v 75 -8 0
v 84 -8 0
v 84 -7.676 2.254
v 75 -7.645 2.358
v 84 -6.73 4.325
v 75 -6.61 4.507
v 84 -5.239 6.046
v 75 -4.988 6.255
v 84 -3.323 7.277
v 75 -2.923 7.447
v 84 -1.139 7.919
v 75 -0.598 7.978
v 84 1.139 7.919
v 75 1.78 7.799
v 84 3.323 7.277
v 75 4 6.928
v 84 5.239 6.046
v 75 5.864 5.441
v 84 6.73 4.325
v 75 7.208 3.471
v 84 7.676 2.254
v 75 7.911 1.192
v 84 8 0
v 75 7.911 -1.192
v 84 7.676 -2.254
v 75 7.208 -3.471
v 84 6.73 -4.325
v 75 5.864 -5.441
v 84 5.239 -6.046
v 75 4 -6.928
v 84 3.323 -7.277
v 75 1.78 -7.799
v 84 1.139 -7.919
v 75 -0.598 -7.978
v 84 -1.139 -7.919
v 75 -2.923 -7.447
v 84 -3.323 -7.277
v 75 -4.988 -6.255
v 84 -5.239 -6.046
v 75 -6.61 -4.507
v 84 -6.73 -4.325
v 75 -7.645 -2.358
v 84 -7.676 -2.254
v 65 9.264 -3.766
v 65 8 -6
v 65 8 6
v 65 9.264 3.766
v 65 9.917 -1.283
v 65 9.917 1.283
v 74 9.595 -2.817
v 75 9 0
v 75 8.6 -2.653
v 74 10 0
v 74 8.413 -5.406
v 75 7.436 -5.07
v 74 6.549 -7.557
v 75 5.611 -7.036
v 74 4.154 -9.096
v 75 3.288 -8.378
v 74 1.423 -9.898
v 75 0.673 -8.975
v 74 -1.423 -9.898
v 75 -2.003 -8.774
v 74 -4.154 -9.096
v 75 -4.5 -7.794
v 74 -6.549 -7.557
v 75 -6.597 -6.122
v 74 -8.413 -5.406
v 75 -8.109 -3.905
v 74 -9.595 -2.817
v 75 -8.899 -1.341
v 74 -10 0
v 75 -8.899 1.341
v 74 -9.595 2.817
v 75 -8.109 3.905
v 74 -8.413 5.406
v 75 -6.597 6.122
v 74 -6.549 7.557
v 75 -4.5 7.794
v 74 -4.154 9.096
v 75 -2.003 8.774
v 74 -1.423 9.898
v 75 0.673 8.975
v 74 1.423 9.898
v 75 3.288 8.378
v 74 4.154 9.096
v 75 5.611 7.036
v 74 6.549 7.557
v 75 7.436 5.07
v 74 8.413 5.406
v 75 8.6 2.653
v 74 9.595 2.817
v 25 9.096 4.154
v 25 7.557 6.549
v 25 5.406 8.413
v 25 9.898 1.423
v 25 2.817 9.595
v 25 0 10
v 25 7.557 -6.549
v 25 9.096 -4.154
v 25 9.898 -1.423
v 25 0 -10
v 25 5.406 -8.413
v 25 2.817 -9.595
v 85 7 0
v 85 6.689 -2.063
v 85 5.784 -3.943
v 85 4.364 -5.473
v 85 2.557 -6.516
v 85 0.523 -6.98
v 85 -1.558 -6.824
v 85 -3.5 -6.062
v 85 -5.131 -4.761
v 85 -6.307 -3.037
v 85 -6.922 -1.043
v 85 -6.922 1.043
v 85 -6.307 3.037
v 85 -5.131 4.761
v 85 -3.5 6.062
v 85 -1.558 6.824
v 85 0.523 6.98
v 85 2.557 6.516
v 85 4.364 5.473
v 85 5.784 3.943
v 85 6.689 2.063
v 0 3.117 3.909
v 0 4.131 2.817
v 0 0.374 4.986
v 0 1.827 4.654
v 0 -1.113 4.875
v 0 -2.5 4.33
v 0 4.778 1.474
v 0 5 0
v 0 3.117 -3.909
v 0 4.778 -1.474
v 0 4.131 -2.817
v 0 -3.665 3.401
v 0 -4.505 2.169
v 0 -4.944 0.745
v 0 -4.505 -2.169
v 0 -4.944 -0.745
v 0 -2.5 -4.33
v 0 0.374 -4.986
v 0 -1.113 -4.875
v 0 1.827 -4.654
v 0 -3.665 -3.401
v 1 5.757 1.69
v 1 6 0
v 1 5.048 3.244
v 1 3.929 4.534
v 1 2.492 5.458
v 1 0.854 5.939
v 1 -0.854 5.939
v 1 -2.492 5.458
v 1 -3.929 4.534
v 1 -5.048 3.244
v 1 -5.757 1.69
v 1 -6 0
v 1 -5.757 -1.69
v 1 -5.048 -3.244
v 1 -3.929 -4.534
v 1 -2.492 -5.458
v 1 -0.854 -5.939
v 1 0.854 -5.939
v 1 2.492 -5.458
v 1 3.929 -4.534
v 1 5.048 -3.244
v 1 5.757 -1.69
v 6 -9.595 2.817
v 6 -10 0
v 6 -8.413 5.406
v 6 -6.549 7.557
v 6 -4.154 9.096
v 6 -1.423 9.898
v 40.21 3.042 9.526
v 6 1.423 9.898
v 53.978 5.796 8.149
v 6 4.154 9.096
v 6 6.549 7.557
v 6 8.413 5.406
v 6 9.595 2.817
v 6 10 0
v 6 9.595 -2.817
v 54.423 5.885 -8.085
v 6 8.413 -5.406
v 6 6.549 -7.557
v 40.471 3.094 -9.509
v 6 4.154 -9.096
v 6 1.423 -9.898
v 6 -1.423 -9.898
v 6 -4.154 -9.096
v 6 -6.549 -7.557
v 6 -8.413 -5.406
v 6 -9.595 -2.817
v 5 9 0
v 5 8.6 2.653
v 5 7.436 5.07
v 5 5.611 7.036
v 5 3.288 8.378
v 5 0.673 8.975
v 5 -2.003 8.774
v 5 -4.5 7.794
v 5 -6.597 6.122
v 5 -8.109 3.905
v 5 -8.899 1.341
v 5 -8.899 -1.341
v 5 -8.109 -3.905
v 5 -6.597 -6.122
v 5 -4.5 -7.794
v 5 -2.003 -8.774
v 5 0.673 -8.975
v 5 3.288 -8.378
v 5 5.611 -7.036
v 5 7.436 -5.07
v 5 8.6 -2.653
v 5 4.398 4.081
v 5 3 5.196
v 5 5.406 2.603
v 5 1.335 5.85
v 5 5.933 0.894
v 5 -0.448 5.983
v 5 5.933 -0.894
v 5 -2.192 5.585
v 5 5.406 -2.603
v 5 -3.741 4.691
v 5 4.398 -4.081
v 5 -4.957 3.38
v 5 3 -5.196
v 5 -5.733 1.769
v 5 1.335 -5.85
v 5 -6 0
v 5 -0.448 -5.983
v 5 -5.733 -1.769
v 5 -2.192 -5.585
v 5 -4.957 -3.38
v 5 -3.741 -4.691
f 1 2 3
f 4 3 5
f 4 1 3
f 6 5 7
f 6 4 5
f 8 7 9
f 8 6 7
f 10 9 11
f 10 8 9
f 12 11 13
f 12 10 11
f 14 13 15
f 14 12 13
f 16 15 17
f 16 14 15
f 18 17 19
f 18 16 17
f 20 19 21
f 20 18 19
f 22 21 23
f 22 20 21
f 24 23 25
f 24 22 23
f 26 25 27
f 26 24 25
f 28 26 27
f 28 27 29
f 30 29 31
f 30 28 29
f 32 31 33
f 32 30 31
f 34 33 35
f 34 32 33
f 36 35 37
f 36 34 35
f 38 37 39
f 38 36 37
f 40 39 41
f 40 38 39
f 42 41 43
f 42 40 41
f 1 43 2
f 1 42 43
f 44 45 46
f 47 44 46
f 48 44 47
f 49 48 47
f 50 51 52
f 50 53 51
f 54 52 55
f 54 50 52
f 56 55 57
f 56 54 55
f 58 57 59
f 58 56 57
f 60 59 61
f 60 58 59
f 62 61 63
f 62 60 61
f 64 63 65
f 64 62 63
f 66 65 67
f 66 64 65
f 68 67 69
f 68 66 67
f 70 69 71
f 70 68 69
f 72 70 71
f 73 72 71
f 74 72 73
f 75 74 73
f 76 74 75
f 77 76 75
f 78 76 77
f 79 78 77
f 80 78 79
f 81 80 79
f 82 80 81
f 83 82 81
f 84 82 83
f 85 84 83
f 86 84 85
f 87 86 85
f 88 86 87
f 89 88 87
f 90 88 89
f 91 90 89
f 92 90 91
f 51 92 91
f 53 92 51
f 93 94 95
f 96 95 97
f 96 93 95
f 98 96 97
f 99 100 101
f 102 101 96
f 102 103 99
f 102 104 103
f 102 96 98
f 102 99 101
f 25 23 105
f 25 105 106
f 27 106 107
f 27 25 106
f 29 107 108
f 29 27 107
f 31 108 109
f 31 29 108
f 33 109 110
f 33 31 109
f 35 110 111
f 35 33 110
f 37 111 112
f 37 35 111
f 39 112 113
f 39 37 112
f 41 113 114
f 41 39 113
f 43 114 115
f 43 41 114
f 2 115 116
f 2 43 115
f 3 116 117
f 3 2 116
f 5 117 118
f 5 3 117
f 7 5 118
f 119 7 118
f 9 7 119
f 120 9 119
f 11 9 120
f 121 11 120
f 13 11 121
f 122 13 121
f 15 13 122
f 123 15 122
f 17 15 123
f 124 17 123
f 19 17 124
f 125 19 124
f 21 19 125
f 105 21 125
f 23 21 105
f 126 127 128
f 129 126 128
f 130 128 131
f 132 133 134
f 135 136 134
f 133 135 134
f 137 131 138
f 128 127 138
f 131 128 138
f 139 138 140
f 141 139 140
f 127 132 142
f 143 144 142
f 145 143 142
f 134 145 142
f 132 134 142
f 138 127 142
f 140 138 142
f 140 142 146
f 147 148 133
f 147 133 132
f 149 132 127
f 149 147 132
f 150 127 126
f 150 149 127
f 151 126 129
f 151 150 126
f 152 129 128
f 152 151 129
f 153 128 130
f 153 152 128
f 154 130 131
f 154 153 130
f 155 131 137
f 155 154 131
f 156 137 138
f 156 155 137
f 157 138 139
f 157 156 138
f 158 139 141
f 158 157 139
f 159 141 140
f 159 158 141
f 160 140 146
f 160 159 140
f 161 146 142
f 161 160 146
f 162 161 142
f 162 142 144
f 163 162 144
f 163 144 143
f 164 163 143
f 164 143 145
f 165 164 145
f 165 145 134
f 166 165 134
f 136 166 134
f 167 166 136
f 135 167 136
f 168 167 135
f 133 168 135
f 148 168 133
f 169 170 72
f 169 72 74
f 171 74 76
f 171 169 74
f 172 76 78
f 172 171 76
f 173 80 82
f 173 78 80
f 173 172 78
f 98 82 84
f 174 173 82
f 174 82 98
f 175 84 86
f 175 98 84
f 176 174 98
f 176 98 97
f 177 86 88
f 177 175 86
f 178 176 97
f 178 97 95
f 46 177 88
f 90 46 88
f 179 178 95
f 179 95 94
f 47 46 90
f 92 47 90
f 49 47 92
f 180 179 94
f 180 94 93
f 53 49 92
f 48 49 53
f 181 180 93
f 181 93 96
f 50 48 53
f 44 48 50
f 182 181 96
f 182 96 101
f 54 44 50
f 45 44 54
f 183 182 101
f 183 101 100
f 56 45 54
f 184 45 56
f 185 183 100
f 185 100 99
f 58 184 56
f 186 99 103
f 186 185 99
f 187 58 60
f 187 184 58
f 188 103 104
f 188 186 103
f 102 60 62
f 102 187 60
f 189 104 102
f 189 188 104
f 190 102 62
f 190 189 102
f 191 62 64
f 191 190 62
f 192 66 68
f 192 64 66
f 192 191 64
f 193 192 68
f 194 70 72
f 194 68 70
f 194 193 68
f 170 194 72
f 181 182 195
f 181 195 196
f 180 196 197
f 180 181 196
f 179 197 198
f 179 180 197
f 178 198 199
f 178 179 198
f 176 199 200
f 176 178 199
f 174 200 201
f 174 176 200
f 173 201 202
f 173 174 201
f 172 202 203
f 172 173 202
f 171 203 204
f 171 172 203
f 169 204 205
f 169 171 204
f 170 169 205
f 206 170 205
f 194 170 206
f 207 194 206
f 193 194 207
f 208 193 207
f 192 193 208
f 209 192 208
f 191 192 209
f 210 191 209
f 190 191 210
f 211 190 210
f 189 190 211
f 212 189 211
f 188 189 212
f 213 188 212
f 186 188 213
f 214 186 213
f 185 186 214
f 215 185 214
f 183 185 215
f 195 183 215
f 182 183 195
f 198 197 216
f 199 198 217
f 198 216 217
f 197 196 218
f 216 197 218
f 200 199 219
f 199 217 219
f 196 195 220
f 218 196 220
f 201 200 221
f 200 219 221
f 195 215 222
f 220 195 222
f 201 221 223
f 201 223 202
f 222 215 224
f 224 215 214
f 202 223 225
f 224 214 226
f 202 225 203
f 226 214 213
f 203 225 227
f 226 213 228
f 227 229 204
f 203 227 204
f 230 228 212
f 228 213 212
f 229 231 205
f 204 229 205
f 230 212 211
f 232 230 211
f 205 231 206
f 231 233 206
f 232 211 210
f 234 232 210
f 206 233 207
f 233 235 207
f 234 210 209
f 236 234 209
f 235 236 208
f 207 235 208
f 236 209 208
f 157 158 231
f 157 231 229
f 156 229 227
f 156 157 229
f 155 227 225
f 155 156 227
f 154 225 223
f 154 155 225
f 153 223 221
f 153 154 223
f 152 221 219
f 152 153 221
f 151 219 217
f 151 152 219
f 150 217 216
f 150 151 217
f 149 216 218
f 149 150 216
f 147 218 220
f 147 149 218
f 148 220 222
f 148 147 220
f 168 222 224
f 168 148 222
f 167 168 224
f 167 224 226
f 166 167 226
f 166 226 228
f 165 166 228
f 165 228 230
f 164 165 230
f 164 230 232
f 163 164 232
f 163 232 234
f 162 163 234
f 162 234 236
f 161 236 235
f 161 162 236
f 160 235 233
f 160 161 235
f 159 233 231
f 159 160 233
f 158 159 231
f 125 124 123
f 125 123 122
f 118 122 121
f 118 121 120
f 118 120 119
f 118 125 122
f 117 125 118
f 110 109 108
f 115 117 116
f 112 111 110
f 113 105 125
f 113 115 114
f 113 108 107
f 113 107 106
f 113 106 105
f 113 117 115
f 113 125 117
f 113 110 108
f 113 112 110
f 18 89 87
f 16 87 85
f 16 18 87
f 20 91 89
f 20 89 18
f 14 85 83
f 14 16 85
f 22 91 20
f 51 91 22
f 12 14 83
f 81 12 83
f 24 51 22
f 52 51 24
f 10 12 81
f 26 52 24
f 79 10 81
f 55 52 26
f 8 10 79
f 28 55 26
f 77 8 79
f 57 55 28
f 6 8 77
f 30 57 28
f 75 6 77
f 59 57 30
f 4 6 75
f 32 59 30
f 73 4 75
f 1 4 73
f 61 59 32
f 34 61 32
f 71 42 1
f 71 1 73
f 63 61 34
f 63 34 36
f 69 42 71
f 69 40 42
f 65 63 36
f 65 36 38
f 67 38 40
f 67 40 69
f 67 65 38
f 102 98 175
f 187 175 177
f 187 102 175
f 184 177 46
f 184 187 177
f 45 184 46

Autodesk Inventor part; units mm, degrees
ref_plane "YZ Plane" through (0, 0, 0) normal (1, 0, 0) x (0, 1, 0)
ref_plane "XZ Plane" through (0, 0, 0) normal (0, 1, 0) x (-1, 0, 0)
ref_plane "XY Plane" through (0, 0, 0) normal (0, 0, 1) x (1, 0, 0)
sketch "草图1" plane through (0, 0, 0) normal (0, 0, 1) x (1, 0, 0)
  line L0 (0, 0) -> (5, 0)
  line L1 (5, 0) -> (5, -6)
  line L2 (5, -6) -> (0, -6)
  line L3 (0, -6) -> (0, 0)
  line L4 (5, 0) -> (75, 0)
  line L5 (75, 0) -> (75, -10)
  line L6 (75, -10) -> (5, -10)
  line L7 (5, -10) -> (5, 0)
  line L8 (75, 0) -> (85, 0)
  line L9 (85, 0) -> (85, -8)
  line L10 (85, -8) -> (75, -8)
  line L11 (75, -8) -> (75, 0)
  dimension "d0" = 5
  dimension "d1" = 6
  dimension "d2" = 70
  dimension "d3" = 10
  dimension "d4" = 10
  dimension "d5" = 8
revolve "旋转1" add sketch "草图1" angle 360 about axis through (5, 0, 0) along (1, 0, 0)
sketch "草图2" plane through (0, 0, 0) normal (0, 0, 1) x (1, 0, 0)
  line L0 (5, 6) -> (0, 6) projected
  line L1 (0, 6) -> (0, -6) projected
  line L2 (1, 6) -> (0, 6)
  line L3 (0, 6) -> (0, 5)
  line L4 (1, 6) -> (0, 5)
  line L5 (1, 6) -> (0, 5)
  line L6 (5, 10) -> (5, -10) projected
  line L7 (5, 10) -> (6, 10)
  line L8 (6, 10) -> (6, 9)
  line L9 (6, 9) -> (5, 9)
  line L10 (5, 9) -> (5, 10)
  line L11 (5, 10) -> (5, 9)
  line L12 (84, 8) -> (84, 7)
  line L13 (84, 7) -> (85, 7)
  line L14 (85, 8) -> (85, -8) projected
  line L15 (85, 8) -> (85, 7)
  line L16 (75, 10) -> (75, -10) projected
  line L17 (75, 10) -> (74, 10)
  line L18 (74, 10) -> (74, 9)
  line L19 (74, 9) -> (75, 9)
  line L20 (75, 9) -> (75, 10)
  line L21 (75, 9) -> (74, 10)
  line L22 (75, 10) -> (75, 9)
  line L23 (85, 8) -> (84, 8)
  line L24 (84, 8) -> (84, 7)
  line L25 (84, 7) -> (85, 7)
  line L26 (85, 7) -> (85, 8)
  line L27 (85, 7) -> (84, 8)
  line L28 (85, 8) -> (85, 7)
  line L29 (6, 10) -> (5, 9)
  line L30 (-17, 0) -> (102, 0) projected
  point P0 (0, 0)
  dimension "d7" = 1
  dimension "d8" = 1
  dimension "d9" = 1
  dimension "d10" = 1
  dimension "d13" = 1
  dimension "d14" = 1
  dimension "d15" = 1
  dimension "d16" = 1
revolve "旋转2" cut sketch "草图2" angle 360 about axis through (-10, 0, 0) along (1, 0, 0) contours L6 L7 L29 | L21 L17 L16 | L27 L23 L14 | L4 L1 L0
sketch "草图3" plane through (0, 0, 0) normal (0, 0, 1) x (1, 0, 0)
  line L0 (74, 10) -> (6, 10) projected
  line L1 (75, 8) -> (75, -8) projected
  line L2 (65, 10) -> (65, 8)
  line L3 (74, 10) -> (74, -10) projected
  line L4 (25, 10) -> (25, 0)
  line L5 (5, 9) -> (5, -9) projected
  line L6 (25, 0) -> (65, 8)
  line L7 (65, 10) -> (25, 10)
  point P0 (0, 0)
  dimension "d18" = 10
  dimension "d19" = 2
  dimension "d20" = 10
  dimension "d21" = 20
extrude "拉伸1" cut sketch "草图3" along normal through all both and the other way through all
properties part number "9-滑轴" material "不锈钢"
